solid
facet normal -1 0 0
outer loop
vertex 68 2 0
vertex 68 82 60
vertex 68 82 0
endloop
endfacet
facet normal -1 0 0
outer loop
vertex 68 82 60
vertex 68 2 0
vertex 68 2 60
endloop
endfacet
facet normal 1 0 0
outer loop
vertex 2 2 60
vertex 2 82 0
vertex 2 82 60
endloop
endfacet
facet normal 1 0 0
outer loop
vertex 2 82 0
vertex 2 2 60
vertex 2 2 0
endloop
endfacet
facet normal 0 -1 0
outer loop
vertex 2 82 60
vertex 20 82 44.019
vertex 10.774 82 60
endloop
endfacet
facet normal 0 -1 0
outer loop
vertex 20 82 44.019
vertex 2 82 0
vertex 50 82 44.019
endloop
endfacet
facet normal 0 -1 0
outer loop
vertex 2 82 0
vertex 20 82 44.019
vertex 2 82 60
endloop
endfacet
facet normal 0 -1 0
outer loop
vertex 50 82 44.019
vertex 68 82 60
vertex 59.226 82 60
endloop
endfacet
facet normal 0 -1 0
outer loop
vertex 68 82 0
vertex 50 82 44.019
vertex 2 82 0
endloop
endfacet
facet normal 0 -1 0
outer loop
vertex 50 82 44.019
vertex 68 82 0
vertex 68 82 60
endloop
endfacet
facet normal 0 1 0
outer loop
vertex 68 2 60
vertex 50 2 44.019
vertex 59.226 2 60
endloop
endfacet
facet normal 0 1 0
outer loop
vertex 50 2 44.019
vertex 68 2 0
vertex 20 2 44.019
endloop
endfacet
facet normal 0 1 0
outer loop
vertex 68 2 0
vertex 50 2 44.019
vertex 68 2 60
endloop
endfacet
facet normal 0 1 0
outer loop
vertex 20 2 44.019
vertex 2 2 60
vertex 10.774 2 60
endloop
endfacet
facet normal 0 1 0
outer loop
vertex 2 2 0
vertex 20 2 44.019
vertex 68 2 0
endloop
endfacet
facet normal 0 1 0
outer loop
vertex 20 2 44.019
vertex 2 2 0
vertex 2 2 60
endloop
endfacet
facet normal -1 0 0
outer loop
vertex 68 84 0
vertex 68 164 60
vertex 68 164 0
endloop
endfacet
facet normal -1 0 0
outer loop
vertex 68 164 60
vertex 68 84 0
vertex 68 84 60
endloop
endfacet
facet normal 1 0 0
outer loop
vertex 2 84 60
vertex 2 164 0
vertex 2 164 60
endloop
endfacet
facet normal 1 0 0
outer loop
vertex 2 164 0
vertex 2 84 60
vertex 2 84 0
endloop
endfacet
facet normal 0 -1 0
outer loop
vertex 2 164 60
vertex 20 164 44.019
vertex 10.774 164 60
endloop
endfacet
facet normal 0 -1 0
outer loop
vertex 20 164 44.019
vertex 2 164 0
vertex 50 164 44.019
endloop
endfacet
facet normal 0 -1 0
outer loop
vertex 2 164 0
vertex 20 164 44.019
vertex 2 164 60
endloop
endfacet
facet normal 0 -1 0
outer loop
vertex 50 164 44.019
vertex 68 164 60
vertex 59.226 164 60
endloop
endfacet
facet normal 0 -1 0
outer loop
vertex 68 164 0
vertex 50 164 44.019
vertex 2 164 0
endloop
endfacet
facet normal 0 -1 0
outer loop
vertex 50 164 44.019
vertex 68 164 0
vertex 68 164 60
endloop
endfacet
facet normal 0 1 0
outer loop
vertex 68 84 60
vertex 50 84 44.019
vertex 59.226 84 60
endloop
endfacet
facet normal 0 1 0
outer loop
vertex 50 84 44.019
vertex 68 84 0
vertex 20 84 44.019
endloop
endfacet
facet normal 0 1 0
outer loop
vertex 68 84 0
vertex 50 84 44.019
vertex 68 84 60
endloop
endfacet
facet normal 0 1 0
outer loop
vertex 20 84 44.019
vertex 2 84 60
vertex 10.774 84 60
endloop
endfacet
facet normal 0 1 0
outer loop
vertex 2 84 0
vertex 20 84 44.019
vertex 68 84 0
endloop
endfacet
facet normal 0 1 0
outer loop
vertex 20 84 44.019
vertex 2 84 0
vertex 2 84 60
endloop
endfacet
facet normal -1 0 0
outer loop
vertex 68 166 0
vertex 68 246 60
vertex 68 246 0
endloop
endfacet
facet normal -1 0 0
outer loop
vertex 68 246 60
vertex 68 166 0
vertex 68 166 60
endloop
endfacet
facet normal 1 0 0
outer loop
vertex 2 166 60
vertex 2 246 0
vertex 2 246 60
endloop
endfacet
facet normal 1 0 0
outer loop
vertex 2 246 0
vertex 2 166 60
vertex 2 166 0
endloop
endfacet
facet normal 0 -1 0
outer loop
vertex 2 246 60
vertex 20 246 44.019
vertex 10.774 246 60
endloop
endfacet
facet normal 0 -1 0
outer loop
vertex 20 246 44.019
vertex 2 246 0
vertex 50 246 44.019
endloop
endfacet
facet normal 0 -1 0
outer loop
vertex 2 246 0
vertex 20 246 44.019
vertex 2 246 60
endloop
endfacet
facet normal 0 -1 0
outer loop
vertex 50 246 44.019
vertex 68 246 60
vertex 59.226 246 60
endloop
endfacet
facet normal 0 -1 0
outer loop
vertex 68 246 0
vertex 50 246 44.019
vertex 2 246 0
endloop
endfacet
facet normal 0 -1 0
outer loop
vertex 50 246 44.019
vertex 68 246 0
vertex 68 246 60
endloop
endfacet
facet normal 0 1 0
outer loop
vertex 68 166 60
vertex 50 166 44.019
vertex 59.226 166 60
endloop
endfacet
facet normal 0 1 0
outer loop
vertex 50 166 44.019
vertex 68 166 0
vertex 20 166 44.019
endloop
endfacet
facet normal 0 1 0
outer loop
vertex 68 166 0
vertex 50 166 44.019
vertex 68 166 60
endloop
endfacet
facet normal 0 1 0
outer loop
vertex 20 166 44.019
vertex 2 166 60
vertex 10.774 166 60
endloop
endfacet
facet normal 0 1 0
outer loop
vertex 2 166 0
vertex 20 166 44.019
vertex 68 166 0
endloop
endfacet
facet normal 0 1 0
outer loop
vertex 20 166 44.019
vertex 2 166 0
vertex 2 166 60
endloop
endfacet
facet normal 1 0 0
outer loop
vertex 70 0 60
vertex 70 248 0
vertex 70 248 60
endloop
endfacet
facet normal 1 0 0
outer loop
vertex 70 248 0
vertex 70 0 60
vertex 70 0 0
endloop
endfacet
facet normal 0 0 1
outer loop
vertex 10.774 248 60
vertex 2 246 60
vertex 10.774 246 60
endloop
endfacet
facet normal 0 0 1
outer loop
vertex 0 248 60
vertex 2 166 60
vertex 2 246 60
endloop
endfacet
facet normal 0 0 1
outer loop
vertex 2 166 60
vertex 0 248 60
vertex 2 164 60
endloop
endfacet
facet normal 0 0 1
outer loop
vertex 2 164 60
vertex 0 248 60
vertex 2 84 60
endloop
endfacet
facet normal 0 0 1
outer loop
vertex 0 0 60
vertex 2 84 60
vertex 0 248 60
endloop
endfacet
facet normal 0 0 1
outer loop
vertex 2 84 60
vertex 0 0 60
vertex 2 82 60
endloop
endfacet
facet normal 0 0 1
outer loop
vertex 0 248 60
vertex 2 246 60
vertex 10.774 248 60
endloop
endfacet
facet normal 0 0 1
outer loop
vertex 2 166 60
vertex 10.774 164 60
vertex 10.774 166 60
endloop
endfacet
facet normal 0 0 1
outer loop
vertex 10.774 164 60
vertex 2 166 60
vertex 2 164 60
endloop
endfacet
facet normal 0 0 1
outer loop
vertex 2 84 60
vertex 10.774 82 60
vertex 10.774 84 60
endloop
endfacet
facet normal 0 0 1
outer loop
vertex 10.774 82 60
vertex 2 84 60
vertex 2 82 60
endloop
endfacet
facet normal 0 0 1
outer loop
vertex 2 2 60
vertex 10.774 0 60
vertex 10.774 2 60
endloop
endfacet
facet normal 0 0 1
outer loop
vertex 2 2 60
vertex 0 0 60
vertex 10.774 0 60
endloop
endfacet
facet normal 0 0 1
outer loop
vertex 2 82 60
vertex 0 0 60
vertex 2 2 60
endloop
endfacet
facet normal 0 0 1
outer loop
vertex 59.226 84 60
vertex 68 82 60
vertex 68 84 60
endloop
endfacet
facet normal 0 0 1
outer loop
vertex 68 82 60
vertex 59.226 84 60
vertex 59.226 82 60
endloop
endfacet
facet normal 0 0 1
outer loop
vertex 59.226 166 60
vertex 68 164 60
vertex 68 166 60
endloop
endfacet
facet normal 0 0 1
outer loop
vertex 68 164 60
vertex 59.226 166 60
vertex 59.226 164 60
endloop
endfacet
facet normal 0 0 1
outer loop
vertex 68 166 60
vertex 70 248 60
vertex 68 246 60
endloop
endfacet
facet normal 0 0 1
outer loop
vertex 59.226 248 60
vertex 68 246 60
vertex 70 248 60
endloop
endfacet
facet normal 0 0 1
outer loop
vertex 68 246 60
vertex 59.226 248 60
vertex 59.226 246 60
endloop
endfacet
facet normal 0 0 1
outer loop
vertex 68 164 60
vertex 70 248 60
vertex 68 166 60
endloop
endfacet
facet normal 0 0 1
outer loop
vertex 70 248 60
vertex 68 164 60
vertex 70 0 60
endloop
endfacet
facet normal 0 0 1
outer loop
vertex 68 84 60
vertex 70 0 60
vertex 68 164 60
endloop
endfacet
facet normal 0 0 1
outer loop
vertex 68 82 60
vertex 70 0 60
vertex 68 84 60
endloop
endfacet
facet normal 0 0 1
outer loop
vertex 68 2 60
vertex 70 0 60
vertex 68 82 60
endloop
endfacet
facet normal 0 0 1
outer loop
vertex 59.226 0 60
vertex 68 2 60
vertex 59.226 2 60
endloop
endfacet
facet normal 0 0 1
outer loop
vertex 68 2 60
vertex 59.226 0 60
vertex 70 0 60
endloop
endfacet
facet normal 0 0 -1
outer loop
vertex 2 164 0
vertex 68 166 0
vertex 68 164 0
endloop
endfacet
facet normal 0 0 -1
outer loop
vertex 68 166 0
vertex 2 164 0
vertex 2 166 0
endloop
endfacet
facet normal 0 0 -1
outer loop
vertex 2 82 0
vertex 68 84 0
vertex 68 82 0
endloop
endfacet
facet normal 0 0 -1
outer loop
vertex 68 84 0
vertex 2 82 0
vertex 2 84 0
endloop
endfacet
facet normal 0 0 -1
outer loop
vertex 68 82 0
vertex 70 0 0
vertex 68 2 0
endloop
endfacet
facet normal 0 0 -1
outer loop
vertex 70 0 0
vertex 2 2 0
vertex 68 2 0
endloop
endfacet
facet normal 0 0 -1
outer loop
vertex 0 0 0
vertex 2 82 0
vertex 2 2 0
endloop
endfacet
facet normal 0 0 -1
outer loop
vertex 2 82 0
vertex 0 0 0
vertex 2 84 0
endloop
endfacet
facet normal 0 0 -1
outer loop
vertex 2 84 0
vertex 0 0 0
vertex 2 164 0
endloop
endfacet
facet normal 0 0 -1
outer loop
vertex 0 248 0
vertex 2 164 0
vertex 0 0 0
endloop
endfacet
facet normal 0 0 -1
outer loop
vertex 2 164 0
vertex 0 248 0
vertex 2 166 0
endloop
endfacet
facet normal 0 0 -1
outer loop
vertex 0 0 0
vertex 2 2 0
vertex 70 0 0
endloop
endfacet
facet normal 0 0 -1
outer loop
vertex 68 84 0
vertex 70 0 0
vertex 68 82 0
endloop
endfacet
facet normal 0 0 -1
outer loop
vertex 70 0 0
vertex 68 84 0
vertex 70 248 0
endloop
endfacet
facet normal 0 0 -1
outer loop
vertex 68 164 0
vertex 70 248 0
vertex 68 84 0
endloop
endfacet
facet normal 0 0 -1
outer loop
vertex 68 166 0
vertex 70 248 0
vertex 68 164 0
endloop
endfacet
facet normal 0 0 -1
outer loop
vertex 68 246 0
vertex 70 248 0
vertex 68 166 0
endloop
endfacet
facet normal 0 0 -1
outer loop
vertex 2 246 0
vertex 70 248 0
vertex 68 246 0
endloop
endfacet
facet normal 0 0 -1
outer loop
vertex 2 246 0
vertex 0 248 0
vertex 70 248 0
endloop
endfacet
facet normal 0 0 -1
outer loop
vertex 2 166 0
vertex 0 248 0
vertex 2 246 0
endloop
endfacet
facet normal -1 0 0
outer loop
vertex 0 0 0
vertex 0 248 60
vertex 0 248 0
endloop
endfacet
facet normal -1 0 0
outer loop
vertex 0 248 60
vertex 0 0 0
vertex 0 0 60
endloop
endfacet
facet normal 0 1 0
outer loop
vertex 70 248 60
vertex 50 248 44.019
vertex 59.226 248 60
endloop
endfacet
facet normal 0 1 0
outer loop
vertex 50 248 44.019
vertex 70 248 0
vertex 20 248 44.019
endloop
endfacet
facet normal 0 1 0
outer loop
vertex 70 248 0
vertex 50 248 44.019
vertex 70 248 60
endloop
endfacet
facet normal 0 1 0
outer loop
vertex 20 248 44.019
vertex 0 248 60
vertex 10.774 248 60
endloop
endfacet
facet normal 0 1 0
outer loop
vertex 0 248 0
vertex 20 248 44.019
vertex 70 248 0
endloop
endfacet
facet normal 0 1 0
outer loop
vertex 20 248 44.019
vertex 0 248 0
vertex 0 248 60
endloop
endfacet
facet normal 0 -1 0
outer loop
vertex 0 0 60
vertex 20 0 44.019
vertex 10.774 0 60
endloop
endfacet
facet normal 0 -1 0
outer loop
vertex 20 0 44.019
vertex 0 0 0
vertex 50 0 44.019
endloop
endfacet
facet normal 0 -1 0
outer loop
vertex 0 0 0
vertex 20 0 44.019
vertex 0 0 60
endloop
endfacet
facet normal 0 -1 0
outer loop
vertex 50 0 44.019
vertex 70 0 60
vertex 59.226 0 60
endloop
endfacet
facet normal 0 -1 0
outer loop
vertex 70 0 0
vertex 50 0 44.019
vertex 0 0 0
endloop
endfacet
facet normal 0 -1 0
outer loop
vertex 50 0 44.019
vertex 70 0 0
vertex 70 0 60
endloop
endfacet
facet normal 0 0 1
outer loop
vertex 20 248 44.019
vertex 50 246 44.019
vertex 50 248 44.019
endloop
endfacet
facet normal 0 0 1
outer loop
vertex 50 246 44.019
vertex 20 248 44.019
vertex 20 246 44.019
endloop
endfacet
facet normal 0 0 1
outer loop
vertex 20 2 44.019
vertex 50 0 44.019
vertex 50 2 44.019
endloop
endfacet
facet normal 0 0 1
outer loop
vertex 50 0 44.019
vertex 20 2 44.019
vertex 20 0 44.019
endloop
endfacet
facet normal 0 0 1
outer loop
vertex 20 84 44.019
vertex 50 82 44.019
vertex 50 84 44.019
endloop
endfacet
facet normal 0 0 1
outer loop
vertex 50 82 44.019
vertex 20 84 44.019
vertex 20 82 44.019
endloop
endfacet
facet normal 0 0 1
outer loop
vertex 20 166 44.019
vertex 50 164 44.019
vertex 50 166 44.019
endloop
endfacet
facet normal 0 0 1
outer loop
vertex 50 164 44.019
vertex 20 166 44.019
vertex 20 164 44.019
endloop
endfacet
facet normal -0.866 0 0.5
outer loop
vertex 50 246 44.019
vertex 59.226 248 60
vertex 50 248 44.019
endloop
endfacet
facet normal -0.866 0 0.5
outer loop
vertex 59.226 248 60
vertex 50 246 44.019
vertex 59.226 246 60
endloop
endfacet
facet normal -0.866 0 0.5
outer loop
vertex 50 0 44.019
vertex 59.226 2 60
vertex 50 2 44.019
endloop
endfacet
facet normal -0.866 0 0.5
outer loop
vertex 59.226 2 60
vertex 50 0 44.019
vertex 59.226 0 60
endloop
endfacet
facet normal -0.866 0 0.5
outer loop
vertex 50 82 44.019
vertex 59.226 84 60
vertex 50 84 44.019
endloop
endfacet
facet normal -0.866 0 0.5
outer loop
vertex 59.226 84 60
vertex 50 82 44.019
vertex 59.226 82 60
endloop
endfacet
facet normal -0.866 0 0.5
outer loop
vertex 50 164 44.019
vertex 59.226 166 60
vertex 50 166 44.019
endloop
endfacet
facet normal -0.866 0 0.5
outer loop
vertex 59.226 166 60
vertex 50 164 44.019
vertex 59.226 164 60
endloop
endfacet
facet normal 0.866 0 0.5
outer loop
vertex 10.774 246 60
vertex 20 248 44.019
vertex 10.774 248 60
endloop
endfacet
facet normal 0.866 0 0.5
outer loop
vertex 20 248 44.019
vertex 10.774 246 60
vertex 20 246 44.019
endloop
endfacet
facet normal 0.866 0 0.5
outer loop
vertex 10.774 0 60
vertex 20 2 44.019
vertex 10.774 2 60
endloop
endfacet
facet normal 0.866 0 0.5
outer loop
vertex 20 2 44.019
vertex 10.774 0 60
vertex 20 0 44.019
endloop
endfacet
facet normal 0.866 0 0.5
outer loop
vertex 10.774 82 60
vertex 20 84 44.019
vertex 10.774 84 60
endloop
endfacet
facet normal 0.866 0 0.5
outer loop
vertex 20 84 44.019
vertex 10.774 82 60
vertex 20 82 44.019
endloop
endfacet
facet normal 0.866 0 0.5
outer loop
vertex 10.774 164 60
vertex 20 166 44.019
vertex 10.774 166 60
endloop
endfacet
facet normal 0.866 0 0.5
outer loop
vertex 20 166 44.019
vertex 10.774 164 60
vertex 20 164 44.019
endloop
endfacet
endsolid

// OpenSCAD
// The first storage is only for cards, and currently just some ideas
pockets = [[2,80],[84,80],[166,80]];
difference() {
    cube([70,248,60]);
    // easier to take the cards
    rotate([-90,0,0])
        translate([35,-70,-1])
            cylinder(250,30,30,$fn=6);
    // pockets for cars here are only three
    for(i=pockets) {
        translate([2,i[0],-1])
            cube([66,i[1],62]);
    }
}
